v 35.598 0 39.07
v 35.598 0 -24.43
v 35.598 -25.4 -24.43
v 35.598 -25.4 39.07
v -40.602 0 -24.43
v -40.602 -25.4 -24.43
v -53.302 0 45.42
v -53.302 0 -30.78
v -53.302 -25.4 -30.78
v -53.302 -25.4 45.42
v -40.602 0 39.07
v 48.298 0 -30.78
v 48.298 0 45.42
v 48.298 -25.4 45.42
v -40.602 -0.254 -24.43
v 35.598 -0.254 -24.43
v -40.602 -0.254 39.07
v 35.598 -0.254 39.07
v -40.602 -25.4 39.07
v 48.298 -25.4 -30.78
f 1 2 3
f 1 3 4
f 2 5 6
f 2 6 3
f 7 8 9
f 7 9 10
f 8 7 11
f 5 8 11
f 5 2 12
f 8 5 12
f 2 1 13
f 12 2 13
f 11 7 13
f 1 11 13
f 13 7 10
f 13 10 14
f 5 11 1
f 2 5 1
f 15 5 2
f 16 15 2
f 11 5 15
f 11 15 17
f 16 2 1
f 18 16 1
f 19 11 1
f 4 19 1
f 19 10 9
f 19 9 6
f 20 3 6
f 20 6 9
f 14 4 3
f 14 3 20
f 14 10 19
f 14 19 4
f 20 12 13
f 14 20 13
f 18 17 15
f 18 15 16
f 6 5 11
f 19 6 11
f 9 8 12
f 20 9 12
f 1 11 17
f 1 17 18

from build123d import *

# Parameters (mm, degrees)
F0_W     = 101.6
F0_H     = 76.2
F0_W_2   = 76.2
F0_H_2   = 63.5
F1_DEPTH = 25.4
F2_DEPTH = 0.254


with BuildPart() as f1:
    # F0 (on Front) → F1 (new body)
    with BuildSketch(Plane.XZ):
        with Locations((-2.502, 7.319848)):
            Rectangle(F0_W, F0_H)
        with Locations((-2.502, 7.319848)):
            Rectangle(F0_W_2, F0_H_2, mode=Mode.SUBTRACT)
    extrude(amount=F1_DEPTH)


with BuildPart() as f2:
    # F0 (on Front) → F2 (new body)
    with BuildSketch(Plane.XZ):
        with Locations((-2.502, 7.319848)):
            Rectangle(F0_W_2, F0_H_2)
    extrude(amount=F2_DEPTH)


solid = Compound([f1.part, f2.part])
